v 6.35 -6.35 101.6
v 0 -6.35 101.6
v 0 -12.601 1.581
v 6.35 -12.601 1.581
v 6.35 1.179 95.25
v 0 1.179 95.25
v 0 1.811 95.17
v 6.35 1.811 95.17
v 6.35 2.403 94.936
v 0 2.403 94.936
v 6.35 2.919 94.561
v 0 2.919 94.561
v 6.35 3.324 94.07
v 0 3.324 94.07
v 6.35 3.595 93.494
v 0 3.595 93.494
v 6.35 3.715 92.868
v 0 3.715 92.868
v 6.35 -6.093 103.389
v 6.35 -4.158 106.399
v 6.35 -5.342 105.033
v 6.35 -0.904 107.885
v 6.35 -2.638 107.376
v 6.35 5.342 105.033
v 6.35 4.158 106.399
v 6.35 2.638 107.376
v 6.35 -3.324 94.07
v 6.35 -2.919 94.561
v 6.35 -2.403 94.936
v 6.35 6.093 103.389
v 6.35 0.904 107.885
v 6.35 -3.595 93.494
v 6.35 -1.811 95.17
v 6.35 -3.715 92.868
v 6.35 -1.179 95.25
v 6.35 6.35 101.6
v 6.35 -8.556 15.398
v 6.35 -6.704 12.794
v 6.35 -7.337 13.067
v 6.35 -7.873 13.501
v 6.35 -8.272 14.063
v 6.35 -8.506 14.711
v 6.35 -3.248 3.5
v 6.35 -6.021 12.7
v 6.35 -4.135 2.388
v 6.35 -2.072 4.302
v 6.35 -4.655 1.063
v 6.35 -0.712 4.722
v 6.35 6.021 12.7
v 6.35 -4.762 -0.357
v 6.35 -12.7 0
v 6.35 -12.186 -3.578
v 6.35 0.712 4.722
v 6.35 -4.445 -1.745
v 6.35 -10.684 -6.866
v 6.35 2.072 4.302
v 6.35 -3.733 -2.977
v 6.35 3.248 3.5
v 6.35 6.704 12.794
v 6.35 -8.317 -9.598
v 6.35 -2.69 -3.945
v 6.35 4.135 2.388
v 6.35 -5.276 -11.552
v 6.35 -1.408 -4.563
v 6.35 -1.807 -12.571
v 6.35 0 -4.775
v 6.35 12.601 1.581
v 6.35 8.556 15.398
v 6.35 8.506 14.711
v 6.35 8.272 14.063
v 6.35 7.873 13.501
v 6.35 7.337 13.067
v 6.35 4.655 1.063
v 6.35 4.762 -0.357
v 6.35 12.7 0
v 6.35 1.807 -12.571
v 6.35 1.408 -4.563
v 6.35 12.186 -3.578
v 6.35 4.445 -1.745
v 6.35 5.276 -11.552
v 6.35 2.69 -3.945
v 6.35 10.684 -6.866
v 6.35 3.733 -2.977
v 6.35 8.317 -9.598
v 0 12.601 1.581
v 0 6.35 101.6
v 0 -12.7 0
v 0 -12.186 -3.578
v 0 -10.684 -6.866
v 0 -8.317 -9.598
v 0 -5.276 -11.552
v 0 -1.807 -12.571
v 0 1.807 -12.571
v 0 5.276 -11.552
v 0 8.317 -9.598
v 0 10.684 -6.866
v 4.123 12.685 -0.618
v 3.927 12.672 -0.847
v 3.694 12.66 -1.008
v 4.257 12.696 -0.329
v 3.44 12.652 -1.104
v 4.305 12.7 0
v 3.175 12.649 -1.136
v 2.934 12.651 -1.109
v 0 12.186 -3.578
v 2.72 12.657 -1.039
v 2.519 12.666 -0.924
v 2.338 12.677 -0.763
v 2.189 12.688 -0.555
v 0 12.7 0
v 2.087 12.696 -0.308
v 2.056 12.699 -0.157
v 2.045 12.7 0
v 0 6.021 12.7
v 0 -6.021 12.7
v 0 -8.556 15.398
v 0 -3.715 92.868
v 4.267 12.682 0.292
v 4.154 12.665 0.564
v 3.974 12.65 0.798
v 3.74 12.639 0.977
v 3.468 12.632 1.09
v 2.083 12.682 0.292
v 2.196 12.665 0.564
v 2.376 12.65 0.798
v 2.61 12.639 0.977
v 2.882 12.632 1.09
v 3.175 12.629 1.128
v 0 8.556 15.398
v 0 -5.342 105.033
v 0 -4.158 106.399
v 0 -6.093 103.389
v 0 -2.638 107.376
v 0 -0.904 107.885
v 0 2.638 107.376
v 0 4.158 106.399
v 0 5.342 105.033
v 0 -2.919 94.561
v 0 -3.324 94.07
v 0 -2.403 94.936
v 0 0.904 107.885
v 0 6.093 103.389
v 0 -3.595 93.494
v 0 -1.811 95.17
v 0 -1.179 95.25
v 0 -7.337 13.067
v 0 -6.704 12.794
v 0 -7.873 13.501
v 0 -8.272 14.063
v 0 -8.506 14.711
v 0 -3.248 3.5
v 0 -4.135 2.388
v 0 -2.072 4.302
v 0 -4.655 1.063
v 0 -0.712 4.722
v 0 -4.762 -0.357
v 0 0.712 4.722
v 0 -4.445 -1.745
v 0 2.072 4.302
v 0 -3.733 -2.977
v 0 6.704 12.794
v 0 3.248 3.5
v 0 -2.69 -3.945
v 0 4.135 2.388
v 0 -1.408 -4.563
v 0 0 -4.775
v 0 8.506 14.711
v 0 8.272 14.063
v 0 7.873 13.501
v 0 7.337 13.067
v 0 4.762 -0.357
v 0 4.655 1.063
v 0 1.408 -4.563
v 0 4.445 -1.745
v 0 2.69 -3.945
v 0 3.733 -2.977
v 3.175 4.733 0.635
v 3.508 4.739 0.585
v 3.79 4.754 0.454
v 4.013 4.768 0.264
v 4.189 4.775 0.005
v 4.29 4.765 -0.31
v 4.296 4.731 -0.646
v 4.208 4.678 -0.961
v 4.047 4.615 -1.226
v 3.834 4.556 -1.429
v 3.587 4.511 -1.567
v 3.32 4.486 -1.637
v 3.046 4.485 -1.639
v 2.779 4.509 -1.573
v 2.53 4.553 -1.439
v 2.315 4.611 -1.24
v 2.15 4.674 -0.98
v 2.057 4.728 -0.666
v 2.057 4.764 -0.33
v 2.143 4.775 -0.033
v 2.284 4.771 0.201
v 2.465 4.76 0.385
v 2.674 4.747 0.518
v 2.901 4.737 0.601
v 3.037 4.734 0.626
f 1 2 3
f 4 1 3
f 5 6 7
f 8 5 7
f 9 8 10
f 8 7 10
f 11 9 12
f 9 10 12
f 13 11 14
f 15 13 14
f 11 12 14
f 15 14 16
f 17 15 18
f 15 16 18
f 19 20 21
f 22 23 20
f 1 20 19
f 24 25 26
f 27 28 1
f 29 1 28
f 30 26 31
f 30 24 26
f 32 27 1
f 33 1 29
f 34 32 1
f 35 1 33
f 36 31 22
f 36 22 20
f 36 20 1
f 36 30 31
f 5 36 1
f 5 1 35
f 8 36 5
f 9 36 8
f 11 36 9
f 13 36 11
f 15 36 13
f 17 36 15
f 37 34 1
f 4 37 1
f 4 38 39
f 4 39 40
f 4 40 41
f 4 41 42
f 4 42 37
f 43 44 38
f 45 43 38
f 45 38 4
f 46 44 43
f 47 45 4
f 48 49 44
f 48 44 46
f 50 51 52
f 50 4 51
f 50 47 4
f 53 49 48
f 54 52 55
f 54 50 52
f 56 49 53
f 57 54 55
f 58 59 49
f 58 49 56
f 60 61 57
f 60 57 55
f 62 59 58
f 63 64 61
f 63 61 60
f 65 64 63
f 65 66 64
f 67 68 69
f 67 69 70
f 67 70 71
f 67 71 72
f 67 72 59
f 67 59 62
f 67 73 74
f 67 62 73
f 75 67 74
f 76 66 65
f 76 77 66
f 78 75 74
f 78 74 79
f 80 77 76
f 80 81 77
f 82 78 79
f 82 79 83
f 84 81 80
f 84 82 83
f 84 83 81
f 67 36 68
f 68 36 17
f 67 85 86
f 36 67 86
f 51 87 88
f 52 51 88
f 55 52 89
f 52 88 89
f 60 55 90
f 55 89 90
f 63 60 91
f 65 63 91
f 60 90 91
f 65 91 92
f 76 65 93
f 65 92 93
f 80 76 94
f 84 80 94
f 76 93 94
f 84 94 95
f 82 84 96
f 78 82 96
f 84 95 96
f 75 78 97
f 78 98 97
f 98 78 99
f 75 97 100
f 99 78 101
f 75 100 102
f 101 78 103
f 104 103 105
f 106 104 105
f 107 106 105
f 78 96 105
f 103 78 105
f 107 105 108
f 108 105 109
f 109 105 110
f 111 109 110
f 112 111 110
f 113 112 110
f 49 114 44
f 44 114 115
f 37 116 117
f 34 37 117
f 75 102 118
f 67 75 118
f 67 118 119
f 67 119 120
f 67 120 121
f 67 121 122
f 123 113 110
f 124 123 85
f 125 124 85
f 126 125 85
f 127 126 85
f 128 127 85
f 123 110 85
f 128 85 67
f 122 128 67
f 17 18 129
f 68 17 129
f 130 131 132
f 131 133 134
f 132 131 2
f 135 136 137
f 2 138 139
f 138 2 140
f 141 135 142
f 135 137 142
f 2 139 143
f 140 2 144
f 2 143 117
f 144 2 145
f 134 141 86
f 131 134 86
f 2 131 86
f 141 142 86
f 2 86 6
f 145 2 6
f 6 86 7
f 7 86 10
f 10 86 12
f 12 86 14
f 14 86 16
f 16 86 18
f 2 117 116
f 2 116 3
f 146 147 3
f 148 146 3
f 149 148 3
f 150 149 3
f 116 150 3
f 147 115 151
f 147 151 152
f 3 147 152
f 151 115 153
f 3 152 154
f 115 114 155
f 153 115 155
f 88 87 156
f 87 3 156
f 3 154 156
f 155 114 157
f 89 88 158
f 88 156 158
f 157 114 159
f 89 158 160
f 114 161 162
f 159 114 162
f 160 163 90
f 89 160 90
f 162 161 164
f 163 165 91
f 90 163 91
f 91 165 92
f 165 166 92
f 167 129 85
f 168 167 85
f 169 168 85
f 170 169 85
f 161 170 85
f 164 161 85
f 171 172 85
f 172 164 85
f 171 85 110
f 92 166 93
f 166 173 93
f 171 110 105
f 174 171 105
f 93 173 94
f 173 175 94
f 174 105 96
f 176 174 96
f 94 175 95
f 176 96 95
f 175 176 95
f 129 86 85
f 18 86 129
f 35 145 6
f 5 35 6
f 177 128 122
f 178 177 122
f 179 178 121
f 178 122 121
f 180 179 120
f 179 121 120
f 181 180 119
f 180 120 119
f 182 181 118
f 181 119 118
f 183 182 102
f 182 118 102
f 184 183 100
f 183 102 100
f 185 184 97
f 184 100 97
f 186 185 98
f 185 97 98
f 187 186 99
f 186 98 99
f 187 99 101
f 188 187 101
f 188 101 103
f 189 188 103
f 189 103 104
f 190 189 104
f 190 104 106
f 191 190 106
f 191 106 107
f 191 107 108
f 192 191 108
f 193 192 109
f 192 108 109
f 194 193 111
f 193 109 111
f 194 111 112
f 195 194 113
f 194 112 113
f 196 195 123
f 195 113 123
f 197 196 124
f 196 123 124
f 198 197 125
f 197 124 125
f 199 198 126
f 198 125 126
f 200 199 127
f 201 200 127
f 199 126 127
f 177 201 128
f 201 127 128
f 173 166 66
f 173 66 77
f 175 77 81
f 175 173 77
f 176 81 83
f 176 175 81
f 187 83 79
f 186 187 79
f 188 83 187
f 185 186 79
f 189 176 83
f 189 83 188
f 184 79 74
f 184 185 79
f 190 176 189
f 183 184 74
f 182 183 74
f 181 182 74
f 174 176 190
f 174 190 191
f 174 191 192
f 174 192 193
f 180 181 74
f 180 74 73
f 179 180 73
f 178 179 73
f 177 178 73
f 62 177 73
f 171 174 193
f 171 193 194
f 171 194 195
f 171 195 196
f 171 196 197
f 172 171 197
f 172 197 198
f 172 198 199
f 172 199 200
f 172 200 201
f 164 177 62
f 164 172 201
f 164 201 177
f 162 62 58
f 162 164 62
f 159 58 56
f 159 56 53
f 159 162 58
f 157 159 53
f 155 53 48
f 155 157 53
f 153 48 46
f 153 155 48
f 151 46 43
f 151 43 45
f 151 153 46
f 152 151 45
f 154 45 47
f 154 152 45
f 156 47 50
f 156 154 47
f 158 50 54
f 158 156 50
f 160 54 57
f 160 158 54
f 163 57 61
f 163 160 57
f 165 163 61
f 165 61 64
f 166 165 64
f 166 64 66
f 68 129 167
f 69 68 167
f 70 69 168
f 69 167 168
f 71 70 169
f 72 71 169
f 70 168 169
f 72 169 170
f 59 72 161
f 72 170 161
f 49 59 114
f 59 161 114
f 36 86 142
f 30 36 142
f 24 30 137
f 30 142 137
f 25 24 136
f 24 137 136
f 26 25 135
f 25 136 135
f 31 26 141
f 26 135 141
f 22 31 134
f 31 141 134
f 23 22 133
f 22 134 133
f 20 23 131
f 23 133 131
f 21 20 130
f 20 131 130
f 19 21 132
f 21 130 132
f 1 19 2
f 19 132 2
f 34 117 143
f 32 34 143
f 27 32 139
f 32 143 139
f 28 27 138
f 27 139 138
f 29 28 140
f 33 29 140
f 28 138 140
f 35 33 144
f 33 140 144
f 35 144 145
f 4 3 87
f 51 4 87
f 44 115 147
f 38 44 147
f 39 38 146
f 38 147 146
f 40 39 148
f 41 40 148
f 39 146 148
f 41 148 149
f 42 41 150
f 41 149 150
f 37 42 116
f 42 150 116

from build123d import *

# Parameters (mm, degrees)
SKETCH1_R                  = 4.7752
BOSS_EXTRUDE1_DEPTH        = 6.35
F_4_40_TAPPED_HOLE1_REACH  = 112.943
F_4_40_TAPPED_HOLE1_BORE_R = 1.1303


with BuildPart() as part:
    # Sketch1 → Boss-Extrude1 (new body)
    with BuildSketch(Plane(origin=(0, 0, 0), x_dir=(0, 0, -1), z_dir=(1, 0, 0))):
        with BuildLine():
            ThreePointArc((0, -12.7), (12.7, 0), (0, 12.7))
            Line((0, 12.7), (-1.581322957, 12.601167315))
            Line((-1.581322957, 12.601167315), (-101.6, 6.35))
            ThreePointArc((-101.6, 6.35), (-107.95, 0), (-101.6, -6.35))
            Line((-101.6, -6.35), (-1.581322957, -12.601167315))
            Line((-1.581322957, -12.601167315), (0, -12.7))
        make_face()
        with BuildLine():
            Line((-12.7, 6.02134877), (-12.7, -6.02134877))
            ThreePointArc((-12.7, -6.02134877), (-13.500867997, -7.872569955), (-15.398440847, -8.556402319))
            Line((-15.398440847, -8.556402319), (-92.868440847, -3.714527319))
            ThreePointArc((-92.868440847, -3.714527319), (-94.561221185, -2.918605773), (-95.25, -1.17947377))
            Line((-95.25, -1.17947377), (-95.25, 1.17947377))
            ThreePointArc((-95.25, 1.17947377), (-94.561221185, 2.918605773), (-92.868440847, 3.714527319))
            Line((-92.868440847, 3.714527319), (-15.398440847, 8.556402319))
            ThreePointArc((-15.398440847, 8.556402319), (-13.500867997, 7.872569955), (-12.7, 6.02134877))
        make_face(mode=Mode.SUBTRACT)
        Circle(SKETCH1_R, mode=Mode.SUBTRACT)
    extrude(amount=BOSS_EXTRUDE1_DEPTH)

    # #4-40 Tapped Hole1 bore (on position points) → #4-40 Tapped Hole1 (cut, up to next)
    with BuildSketch(Plane(origin=(3.175, 12.7, 0), x_dir=(0, -0.062378286155, 0.998052578483), z_dir=(0, 0.998052578483, 0.062378286155)), mode=Mode.PRIVATE) as f_4_40_tapped_hole1_sk1:
        Circle(F_4_40_TAPPED_HOLE1_BORE_R)
    f_4_40_tapped_hole1_tool1 = extrude(f_4_40_tapped_hole1_sk1.sketch, amount=-F_4_40_TAPPED_HOLE1_REACH, mode=Mode.PRIVATE) & part.part
    add(f_4_40_tapped_hole1_tool1.solids().sort_by_distance((3.175, 12.7, 0))[0], mode=Mode.SUBTRACT)


solid = part.part
